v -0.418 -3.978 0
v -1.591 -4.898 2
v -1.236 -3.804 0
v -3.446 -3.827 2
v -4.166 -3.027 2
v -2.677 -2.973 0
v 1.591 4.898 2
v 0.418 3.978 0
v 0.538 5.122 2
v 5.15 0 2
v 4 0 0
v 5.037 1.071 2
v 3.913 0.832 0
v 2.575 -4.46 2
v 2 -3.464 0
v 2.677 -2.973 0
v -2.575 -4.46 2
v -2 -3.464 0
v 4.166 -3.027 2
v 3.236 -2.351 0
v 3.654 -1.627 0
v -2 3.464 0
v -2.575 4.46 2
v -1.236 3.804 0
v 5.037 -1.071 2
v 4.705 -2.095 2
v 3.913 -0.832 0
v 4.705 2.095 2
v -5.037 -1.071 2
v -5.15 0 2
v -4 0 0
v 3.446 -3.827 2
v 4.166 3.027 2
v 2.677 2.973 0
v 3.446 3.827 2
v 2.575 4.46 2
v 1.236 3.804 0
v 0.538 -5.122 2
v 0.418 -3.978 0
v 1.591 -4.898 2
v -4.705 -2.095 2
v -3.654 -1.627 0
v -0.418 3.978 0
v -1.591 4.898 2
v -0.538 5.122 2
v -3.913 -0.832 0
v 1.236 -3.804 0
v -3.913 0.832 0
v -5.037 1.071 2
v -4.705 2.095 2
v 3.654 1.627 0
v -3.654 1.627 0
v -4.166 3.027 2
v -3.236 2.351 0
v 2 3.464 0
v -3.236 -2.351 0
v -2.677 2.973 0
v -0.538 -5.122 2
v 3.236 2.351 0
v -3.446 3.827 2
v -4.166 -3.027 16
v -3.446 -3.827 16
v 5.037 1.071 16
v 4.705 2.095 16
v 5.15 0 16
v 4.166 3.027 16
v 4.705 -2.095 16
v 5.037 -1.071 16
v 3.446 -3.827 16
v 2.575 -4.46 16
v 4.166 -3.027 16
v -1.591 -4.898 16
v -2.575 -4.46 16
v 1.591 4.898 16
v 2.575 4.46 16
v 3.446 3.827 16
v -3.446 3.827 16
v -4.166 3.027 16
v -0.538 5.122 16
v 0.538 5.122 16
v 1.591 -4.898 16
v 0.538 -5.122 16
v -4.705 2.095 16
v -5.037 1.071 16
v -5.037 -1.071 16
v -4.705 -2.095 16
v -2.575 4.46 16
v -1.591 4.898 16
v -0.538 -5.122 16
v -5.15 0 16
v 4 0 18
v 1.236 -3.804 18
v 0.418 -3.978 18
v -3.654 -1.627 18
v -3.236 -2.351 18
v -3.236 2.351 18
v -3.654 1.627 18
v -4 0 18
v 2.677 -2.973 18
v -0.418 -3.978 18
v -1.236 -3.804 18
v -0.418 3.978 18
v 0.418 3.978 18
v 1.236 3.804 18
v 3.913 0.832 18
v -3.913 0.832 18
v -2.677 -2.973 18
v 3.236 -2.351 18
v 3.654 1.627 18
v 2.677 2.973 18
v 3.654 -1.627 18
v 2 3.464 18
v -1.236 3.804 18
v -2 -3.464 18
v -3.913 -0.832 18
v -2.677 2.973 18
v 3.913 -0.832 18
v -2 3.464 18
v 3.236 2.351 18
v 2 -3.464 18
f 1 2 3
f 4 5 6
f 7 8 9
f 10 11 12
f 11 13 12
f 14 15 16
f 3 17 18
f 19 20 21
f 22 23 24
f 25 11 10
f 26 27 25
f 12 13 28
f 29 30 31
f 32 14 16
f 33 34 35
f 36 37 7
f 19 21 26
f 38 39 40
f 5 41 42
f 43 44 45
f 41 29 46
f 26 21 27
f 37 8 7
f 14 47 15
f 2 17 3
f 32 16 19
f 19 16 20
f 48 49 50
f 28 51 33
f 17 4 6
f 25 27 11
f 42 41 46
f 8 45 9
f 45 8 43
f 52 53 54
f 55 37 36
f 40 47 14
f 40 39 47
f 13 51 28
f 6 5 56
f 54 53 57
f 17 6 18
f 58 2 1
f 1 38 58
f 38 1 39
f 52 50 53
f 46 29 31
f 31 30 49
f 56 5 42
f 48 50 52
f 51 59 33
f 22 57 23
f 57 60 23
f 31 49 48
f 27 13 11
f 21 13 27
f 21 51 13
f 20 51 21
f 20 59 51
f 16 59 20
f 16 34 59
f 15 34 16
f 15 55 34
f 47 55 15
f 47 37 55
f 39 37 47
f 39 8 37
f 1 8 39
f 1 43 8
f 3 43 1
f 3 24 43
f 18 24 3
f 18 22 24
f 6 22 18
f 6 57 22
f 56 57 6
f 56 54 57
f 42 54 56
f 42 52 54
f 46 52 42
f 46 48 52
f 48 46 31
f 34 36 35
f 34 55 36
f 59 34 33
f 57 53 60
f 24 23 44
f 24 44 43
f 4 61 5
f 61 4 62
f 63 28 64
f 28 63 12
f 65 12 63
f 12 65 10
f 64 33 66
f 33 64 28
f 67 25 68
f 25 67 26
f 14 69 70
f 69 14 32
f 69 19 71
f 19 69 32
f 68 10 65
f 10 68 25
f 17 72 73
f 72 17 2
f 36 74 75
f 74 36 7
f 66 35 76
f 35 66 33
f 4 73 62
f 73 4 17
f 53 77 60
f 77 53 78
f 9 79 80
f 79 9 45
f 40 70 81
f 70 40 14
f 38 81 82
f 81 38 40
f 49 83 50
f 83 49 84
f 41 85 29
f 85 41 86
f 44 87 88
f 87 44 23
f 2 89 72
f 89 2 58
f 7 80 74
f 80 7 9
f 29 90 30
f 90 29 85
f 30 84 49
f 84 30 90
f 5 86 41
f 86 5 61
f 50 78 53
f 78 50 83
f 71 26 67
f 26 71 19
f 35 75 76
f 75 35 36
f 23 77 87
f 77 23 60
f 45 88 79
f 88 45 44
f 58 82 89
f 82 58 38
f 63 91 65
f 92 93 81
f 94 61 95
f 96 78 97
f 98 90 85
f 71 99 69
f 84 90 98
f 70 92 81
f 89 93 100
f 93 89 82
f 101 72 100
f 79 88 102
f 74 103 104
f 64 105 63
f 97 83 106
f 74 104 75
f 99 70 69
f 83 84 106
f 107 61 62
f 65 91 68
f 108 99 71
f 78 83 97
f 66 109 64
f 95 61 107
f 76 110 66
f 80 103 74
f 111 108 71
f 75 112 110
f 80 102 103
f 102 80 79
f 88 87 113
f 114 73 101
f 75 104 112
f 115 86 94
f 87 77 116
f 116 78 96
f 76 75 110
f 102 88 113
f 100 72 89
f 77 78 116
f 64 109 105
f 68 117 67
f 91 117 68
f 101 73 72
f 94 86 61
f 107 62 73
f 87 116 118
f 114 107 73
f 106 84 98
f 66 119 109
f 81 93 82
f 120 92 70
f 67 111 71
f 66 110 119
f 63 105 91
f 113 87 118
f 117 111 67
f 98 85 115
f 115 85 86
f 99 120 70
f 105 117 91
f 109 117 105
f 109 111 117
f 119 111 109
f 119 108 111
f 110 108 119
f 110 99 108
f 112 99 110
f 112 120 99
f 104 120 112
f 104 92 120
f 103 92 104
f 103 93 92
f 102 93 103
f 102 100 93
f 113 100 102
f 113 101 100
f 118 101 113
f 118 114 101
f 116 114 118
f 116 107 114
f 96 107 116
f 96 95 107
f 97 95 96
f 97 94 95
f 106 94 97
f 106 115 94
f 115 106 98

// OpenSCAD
// centreurs
h=18;
r=5.15;

cylinder(2,4,r,$fn=30);
translate([0,0,2]) cylinder(h-4,r,r,$fn=30);
translate([0,0,h-2]) cylinder(2,r,4,$fn=30);
